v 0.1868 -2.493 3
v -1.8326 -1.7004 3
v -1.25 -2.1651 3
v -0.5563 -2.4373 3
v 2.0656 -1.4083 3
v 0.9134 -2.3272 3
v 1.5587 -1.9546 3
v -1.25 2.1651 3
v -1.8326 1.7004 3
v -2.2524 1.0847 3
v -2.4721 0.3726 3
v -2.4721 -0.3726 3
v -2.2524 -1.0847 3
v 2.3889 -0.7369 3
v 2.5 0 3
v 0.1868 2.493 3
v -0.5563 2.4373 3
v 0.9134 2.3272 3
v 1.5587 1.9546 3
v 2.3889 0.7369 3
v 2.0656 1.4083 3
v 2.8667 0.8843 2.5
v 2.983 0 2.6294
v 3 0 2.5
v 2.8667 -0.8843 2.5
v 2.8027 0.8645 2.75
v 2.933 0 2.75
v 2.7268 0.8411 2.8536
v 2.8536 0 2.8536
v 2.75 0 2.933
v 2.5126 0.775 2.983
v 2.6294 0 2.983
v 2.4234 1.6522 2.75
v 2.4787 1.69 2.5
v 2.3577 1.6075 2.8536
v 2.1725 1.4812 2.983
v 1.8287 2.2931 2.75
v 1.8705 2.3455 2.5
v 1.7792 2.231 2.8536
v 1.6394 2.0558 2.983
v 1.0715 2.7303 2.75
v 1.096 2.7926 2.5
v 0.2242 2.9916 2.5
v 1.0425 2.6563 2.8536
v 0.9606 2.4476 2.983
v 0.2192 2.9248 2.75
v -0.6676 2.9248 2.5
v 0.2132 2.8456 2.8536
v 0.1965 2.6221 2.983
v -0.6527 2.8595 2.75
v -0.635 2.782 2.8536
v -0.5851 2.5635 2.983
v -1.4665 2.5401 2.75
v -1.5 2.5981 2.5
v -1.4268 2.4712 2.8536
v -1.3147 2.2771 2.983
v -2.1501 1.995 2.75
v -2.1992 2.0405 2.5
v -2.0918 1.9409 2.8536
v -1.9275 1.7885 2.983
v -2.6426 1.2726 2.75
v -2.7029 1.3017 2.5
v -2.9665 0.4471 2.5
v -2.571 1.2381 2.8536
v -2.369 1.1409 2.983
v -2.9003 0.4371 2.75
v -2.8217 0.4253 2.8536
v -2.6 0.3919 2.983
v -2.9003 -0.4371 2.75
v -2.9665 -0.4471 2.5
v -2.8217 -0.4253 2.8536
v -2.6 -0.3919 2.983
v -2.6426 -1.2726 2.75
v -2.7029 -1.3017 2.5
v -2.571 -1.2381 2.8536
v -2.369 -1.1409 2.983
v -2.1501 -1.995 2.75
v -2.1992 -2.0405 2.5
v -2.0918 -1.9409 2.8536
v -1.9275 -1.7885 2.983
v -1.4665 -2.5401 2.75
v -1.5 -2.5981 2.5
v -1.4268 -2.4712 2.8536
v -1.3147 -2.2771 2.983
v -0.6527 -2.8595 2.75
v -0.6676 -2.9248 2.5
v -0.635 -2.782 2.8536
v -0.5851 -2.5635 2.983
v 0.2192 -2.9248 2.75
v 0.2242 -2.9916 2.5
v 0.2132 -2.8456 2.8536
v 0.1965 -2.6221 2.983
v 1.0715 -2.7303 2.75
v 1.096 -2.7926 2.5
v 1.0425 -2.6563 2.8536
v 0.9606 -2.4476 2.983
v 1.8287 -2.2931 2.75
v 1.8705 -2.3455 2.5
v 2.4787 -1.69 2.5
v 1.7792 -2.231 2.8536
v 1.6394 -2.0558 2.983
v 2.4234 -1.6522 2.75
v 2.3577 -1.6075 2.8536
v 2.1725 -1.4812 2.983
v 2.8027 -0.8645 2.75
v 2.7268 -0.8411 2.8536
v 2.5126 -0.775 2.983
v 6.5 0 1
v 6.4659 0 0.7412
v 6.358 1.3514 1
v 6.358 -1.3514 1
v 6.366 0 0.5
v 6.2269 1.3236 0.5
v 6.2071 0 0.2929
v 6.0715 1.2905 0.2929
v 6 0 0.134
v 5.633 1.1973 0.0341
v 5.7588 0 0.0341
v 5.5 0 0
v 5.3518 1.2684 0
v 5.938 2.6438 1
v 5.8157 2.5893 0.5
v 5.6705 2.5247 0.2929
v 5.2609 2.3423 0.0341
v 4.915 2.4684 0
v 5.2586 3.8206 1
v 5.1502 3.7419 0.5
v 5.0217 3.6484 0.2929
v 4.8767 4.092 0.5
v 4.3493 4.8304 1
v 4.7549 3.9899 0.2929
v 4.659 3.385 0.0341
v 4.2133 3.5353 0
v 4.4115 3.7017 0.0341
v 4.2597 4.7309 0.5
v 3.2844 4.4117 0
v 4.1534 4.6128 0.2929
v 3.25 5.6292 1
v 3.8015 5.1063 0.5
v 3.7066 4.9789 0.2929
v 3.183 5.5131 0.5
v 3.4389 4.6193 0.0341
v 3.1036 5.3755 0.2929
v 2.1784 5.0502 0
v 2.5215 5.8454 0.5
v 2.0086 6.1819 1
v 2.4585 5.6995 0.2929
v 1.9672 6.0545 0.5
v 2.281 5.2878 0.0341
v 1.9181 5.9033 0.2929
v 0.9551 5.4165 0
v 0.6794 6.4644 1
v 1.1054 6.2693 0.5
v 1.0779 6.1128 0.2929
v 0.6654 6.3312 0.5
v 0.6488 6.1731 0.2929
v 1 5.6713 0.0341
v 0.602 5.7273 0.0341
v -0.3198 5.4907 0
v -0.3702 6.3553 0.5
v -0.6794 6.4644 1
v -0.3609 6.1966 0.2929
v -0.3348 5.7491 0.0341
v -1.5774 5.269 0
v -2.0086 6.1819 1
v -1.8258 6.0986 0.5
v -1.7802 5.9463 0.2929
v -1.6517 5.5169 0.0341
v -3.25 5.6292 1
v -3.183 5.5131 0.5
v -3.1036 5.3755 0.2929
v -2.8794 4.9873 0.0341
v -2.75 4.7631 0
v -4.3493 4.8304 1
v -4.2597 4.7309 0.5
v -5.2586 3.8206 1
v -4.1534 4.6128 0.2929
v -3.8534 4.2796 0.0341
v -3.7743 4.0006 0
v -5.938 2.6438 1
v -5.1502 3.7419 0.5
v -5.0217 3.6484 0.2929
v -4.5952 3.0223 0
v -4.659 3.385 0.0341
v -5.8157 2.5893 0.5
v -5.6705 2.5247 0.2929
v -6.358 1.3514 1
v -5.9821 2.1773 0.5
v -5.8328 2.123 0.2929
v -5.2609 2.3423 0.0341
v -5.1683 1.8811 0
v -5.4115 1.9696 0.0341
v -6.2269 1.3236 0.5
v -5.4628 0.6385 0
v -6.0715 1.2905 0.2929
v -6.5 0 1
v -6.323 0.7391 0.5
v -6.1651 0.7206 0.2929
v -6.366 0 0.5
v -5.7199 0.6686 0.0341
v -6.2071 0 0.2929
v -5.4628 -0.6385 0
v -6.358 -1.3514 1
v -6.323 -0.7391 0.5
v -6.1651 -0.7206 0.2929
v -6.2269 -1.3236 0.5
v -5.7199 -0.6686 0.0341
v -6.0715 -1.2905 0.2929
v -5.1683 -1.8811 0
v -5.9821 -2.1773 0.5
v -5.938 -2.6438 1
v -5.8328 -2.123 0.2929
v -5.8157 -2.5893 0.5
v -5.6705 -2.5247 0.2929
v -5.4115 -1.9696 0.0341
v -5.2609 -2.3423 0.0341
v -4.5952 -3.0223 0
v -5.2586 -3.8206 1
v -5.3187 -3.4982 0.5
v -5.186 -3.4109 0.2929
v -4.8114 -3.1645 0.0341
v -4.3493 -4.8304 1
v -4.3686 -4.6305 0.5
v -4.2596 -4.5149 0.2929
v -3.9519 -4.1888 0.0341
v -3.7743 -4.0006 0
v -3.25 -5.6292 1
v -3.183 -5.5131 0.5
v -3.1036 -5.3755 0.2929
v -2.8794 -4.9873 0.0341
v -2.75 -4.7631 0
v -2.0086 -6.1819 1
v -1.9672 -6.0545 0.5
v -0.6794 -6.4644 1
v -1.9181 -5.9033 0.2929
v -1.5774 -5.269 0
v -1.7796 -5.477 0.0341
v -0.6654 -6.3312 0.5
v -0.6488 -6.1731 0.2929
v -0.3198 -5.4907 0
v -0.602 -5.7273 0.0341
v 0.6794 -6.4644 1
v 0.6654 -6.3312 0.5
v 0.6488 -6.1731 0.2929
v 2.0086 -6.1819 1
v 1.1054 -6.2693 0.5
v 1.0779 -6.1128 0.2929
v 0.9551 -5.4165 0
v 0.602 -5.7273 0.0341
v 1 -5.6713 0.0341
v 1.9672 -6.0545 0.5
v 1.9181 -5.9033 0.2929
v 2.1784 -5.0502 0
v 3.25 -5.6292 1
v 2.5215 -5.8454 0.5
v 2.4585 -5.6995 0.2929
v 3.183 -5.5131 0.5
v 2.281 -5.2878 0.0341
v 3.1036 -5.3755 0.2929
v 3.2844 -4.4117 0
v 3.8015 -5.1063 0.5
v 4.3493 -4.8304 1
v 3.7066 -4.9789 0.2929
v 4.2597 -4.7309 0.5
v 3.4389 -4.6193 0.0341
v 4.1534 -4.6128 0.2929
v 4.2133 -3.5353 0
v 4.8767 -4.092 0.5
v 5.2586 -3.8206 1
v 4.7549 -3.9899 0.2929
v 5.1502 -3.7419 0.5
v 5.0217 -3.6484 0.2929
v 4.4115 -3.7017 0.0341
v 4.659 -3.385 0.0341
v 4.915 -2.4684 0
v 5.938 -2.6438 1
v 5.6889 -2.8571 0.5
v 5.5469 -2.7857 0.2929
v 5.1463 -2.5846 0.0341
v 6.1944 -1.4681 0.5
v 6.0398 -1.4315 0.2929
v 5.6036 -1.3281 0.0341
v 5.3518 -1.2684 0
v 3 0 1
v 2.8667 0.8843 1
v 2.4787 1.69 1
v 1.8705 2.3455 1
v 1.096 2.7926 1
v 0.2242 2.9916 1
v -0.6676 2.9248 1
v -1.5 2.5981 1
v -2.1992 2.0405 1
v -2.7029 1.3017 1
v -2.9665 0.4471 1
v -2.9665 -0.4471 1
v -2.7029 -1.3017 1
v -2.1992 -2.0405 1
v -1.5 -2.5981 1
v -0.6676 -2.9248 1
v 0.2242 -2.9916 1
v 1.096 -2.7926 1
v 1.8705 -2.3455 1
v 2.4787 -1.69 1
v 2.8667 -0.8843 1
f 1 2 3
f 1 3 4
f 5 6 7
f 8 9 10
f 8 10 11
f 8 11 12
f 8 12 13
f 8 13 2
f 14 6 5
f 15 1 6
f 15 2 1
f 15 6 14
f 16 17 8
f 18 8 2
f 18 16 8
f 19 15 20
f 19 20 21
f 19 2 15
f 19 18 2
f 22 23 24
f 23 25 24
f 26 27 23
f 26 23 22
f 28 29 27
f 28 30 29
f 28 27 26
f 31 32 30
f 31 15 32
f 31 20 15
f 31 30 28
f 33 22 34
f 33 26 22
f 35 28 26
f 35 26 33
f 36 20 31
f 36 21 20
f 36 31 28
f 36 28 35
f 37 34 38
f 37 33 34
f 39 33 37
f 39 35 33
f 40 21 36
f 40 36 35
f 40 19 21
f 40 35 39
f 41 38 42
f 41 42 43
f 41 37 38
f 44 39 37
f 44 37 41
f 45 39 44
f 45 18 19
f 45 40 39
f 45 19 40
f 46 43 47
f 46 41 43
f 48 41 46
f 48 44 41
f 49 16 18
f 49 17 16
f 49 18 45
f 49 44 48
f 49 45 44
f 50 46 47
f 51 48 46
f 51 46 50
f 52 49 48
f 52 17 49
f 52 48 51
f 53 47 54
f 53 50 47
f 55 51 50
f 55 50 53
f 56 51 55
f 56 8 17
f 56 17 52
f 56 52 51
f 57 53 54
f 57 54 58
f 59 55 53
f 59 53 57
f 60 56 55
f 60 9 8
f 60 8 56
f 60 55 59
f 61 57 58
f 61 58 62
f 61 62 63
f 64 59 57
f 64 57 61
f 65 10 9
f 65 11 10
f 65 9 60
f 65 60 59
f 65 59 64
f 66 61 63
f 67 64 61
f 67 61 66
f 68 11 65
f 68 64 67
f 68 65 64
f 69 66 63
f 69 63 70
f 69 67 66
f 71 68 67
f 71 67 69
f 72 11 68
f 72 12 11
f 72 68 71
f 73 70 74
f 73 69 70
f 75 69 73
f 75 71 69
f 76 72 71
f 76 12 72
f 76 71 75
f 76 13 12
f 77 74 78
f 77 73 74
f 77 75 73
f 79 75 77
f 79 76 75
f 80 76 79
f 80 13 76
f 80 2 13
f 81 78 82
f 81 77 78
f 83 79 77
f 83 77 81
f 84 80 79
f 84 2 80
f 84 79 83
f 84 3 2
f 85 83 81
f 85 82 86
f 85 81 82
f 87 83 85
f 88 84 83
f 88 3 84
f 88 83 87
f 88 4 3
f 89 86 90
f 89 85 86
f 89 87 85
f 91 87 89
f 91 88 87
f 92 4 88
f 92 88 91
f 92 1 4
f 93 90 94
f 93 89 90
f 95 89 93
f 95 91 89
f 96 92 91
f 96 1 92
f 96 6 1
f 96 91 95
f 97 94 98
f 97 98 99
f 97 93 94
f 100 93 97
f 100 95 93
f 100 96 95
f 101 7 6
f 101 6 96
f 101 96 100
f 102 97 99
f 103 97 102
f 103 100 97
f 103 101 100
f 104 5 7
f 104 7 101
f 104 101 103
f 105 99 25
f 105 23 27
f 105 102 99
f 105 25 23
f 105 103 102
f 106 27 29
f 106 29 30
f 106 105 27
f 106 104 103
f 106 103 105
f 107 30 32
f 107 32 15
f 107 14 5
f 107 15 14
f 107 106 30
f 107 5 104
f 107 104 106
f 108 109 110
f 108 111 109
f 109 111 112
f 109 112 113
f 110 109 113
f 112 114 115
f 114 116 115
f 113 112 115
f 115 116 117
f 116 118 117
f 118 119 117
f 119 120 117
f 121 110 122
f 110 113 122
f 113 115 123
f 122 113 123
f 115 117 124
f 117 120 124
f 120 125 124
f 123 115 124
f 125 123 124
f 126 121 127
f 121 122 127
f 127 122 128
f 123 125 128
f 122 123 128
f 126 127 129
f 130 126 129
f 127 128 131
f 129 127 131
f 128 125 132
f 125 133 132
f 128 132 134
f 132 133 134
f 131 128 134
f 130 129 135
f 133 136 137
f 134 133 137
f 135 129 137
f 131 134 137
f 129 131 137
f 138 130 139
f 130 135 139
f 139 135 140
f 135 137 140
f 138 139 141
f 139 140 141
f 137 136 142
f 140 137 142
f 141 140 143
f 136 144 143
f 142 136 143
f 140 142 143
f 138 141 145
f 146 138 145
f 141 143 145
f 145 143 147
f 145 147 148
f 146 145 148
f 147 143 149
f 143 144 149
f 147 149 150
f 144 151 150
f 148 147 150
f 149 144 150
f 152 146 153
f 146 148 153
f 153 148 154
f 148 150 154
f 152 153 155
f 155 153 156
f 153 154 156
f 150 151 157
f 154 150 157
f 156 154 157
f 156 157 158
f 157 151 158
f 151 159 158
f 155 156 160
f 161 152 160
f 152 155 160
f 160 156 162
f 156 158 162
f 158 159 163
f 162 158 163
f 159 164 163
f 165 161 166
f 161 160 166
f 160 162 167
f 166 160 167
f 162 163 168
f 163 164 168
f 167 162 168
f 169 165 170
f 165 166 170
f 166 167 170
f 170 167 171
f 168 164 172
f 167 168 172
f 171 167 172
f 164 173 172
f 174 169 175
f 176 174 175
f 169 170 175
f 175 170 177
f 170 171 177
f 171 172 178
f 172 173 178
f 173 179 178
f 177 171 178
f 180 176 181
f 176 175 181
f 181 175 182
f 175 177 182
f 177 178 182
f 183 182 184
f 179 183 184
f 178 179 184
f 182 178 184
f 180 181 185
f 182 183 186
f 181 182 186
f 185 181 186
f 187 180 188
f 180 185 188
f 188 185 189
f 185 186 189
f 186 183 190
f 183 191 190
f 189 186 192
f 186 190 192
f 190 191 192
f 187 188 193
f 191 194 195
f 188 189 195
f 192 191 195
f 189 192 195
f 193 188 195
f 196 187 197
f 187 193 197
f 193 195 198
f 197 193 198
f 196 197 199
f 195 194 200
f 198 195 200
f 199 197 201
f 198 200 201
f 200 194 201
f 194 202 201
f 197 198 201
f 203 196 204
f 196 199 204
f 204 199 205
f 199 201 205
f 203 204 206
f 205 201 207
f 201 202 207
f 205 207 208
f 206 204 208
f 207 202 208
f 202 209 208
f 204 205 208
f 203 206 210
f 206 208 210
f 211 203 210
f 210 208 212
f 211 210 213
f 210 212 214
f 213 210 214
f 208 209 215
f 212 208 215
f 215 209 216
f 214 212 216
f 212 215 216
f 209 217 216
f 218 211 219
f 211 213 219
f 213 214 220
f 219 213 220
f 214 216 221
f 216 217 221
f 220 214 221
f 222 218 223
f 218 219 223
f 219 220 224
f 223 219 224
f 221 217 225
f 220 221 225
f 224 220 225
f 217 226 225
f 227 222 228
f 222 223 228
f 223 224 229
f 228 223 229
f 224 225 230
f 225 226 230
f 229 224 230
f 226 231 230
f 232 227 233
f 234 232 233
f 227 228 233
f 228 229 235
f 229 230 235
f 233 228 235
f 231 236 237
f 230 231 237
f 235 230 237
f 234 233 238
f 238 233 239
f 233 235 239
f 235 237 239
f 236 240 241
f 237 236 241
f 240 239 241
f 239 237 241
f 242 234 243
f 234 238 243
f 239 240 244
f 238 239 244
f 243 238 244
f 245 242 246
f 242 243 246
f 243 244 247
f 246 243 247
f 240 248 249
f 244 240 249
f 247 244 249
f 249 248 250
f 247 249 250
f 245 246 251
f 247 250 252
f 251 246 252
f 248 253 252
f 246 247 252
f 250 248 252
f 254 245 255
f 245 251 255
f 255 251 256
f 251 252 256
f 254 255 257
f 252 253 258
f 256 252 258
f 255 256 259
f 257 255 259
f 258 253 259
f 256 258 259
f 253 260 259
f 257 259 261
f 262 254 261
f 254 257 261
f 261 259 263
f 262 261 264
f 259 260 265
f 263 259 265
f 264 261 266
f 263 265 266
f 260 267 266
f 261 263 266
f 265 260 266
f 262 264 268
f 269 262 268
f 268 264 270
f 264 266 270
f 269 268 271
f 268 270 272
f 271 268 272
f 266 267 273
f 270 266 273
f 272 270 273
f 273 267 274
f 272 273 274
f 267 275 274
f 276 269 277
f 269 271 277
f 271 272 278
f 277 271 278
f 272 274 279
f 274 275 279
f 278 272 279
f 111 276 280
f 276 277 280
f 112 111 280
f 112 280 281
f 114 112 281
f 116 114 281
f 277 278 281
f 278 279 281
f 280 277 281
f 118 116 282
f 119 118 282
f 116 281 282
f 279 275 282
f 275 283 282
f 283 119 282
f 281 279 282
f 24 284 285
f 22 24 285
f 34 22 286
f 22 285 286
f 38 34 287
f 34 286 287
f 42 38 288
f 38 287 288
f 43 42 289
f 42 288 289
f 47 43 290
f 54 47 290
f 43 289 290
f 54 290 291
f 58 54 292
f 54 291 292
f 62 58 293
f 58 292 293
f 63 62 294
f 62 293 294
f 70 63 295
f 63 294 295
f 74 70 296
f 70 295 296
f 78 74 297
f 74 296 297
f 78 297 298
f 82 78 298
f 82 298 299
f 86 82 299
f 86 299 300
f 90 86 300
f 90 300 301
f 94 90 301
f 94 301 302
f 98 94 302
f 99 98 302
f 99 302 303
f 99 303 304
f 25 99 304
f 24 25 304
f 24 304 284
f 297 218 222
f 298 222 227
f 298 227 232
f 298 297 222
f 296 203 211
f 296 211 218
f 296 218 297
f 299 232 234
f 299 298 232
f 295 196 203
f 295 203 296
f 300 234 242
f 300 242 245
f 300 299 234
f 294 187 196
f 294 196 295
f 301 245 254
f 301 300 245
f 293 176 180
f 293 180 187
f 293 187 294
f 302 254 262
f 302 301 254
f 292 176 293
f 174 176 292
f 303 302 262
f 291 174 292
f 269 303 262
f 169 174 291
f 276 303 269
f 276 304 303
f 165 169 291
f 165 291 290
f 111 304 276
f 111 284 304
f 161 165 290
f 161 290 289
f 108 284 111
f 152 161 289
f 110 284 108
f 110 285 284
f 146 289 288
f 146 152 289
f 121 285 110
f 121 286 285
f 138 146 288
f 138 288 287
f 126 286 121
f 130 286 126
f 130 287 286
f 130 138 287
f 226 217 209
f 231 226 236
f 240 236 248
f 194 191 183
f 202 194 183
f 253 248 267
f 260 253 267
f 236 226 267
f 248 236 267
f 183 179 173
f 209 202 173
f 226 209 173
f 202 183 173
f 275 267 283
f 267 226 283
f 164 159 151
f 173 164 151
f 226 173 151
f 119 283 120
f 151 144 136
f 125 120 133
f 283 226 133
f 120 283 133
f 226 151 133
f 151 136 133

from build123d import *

# Parameters (mm, degrees)
F0_R     = 6.5
F0_R_2   = 3
F1_DEPTH = 1
F2_DEPTH = 3
F3_R     = 0.99999
F4_R     = 0.5


# Not quite as in the source:
# - a fillet or chamfer is up to 0.001 mm smaller than in the source, because OpenCascade refuses the exact size


with BuildPart() as f1:
    # F0 (on Top) → F1 (new body)
    with BuildSketch(Plane.XY):
        Circle(F0_R)
        Circle(F0_R_2, mode=Mode.SUBTRACT)
    extrude(amount=F1_DEPTH)

    # F0 (on Top) → F2 (join)
    with BuildSketch(Plane.XY):
        Circle(F0_R_2)
    extrude(amount=F2_DEPTH)

    # F3 (radius 1 in the source; OpenCascade refuses exactly that, so slightly less here)
    f3_edges = [f1.edges().sort_by_distance(p)[0] for p in [
        (-6.5, 0, 0),
    ]]
    fillet(f3_edges, radius=F3_R)

    # F4
    f4_edges = [f1.edges().sort_by_distance(p)[0] for p in [
        (-3, 0, 3),
    ]]
    fillet(f4_edges, radius=F4_R)


solid = f1.part
